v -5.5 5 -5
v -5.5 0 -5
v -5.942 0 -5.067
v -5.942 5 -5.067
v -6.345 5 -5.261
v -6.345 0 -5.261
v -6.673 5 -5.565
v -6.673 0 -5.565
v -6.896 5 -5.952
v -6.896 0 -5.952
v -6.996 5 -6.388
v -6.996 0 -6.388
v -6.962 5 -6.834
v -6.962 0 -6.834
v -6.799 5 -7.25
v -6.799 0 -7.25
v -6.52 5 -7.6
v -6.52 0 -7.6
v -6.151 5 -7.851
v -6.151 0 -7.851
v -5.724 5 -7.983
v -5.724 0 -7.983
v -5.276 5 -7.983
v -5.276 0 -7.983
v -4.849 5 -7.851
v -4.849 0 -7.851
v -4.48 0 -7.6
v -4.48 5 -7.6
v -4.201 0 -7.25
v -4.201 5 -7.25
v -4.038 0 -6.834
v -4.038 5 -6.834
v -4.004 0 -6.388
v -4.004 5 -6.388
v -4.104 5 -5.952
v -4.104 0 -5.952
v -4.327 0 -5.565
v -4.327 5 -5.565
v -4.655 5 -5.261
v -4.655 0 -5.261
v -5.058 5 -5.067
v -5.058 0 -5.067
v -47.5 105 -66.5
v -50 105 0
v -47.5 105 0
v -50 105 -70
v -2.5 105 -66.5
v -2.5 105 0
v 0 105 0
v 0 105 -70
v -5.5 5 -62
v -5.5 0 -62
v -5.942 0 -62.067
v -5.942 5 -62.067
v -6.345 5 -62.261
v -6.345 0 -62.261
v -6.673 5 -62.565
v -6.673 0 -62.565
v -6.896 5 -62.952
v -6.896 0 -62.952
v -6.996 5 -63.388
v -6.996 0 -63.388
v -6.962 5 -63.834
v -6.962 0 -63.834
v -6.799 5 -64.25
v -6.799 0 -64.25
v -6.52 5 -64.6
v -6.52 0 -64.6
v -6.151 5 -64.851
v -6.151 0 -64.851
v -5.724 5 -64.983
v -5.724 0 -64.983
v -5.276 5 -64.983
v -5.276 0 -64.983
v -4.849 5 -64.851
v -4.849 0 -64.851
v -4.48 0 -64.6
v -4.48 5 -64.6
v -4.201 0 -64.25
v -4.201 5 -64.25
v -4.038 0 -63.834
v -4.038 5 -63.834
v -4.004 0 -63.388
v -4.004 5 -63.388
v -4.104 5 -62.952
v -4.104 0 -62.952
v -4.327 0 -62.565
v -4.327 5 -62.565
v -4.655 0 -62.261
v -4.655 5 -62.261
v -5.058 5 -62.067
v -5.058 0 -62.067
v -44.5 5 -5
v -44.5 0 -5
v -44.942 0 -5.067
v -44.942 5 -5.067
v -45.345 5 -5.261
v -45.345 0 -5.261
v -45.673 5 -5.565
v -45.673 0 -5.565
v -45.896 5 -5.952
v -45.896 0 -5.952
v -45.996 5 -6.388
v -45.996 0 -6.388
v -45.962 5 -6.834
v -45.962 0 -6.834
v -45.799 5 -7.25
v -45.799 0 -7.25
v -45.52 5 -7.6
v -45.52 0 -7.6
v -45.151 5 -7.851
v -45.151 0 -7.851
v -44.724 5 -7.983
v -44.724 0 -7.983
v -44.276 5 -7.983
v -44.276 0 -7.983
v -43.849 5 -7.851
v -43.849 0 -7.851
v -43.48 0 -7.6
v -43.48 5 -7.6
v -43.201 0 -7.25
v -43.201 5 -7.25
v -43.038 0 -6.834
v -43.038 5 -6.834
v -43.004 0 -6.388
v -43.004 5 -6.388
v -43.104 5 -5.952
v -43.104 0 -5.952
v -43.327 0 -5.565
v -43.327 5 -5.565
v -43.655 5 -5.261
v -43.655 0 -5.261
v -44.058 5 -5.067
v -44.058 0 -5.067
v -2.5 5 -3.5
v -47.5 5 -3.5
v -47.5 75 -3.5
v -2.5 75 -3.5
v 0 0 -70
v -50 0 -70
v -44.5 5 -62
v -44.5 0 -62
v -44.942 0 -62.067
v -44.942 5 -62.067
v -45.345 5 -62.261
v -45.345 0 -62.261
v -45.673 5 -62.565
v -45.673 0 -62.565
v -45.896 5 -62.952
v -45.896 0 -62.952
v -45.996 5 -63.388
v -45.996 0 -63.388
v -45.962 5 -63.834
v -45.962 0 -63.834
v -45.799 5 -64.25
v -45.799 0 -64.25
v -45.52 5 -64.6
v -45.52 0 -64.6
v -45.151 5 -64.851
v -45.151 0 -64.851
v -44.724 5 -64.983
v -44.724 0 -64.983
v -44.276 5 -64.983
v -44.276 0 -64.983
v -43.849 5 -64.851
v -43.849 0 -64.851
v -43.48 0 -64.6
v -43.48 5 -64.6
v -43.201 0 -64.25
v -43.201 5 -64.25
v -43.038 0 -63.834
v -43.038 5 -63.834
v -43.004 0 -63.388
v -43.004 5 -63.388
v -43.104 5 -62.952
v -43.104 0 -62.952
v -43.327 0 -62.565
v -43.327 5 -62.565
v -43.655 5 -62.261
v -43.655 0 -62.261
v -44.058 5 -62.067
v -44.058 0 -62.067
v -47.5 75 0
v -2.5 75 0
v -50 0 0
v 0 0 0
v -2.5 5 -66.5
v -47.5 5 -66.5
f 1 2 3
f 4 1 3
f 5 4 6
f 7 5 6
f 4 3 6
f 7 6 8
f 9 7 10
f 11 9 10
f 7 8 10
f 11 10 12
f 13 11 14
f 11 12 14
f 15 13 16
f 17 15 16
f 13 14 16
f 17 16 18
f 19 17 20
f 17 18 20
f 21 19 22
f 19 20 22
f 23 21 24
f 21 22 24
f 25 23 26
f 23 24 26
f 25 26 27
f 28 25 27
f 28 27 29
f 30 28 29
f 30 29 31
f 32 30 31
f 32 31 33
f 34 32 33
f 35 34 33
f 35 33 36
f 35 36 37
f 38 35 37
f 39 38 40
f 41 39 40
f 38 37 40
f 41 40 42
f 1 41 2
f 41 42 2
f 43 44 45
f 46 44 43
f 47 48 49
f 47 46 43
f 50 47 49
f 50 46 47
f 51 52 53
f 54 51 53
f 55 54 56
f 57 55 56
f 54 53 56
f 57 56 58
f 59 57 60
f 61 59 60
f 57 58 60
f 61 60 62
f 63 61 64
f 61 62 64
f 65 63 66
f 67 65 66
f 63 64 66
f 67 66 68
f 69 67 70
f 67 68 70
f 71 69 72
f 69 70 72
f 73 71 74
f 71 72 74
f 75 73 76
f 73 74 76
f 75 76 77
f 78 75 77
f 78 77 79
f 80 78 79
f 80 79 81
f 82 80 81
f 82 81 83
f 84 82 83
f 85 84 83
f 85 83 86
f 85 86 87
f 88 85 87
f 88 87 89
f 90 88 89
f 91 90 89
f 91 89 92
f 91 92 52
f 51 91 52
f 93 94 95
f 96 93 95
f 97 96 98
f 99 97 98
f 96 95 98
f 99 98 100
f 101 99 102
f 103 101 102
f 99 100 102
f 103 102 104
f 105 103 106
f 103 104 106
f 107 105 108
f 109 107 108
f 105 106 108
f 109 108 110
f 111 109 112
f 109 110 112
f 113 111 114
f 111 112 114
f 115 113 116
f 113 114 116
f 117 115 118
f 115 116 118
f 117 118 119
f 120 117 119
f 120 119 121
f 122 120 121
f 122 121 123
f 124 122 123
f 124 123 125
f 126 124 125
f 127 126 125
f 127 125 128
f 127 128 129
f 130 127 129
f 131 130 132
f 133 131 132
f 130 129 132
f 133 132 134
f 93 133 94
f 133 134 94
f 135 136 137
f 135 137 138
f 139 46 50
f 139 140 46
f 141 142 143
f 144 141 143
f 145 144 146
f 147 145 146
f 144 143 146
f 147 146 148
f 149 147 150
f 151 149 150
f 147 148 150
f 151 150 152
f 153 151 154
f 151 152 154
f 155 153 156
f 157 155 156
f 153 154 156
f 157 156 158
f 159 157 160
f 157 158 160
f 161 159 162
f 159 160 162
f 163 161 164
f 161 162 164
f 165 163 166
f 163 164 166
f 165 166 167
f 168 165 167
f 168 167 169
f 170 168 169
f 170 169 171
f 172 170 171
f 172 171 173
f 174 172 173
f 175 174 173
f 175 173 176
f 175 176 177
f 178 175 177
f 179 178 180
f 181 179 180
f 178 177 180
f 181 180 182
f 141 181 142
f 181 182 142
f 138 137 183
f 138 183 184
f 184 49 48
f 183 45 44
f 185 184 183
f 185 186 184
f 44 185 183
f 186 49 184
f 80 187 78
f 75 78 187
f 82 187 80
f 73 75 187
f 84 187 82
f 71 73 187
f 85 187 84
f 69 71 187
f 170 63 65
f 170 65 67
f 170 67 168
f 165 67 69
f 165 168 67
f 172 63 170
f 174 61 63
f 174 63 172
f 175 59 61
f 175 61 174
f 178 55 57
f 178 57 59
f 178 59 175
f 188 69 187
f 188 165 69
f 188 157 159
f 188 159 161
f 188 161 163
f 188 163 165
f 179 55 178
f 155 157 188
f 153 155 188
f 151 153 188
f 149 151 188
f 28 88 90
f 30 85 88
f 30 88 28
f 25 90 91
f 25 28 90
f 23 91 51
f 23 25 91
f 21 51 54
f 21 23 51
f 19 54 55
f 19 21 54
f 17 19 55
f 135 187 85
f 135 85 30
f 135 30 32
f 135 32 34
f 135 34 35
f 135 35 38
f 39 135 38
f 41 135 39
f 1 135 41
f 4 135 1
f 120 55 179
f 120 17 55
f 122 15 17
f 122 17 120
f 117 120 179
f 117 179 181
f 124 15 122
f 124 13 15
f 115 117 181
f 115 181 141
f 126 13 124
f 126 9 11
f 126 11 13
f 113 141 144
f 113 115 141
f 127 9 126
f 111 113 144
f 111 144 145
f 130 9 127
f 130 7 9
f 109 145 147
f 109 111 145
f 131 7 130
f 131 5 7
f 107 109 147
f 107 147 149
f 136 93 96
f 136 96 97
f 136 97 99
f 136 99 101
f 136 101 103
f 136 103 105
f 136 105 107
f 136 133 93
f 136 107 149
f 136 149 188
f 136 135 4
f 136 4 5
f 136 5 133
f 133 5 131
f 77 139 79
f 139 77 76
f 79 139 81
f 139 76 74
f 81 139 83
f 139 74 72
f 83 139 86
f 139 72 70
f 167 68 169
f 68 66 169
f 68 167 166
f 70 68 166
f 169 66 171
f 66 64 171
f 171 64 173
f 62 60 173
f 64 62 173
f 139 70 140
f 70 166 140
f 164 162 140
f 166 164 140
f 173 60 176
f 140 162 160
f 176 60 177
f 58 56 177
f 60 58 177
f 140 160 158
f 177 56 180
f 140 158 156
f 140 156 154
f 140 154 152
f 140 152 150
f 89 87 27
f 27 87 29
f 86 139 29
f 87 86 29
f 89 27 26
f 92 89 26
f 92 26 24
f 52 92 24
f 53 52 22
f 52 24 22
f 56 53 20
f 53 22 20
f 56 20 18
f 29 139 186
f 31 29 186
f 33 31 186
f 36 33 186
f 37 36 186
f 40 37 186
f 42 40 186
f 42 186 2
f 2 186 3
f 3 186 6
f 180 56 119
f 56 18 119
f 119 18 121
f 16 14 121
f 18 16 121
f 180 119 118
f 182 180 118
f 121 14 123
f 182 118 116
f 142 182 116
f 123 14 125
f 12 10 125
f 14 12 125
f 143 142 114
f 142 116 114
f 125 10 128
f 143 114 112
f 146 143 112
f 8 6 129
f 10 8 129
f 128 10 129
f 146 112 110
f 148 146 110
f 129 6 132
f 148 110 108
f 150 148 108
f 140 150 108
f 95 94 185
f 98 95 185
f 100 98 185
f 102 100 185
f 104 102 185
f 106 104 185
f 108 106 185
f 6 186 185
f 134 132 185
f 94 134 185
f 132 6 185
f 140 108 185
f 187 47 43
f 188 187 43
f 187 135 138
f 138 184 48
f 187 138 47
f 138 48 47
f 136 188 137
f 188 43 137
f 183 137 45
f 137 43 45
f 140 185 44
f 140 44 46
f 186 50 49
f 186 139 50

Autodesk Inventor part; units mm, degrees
ref_plane "YZ Plane" through (0, 0, 0) normal (1, 0, 0) x (0, 1, 0)
ref_plane "XZ Plane" through (0, 0, 0) normal (0, 1, 0) x (-1, 0, 0)
ref_plane "XY Plane" through (0, 0, 0) normal (0, 0, 1) x (1, 0, 0)
sketch "Sketch1" plane through (0, 0, 0) normal (0, 1, 0) x (-1, 0, 0)
  line L0 (0, 0) -> (50, 0)
  line L1 (50, 0) -> (50, -70)
  line L2 (50, -70) -> (0, -70)
  line L3 (0, -70) -> (0, 0)
  dimension "d0" = 50
  dimension "d1" = 70
extrude "Extrusion1" add sketch "Sketch1" along normal blind 5
sketch "Sketch2" plane through (0, 5, 0) normal (0, 1, 0) x (1, 0, 0)
  line L0 (0, 0) -> (-50, 0)
  line L1 (-50, 70) -> (0, 70)
  line L2 (-2.5, 66.5) -> (-47.5, 66.5)
  line L3 (-47.5, 66.5) -> (-47.5, 3.5)
  line L4 (-47.5, 3.5) -> (-2.5, 3.5)
  line L5 (-2.5, 3.5) -> (-2.5, 66.5)
  line L6 (0, 0) -> (0, 70) projected
  line L7 (-50, 70) -> (-50, 0) projected
  line L8 (0, 70) -> (-50, 70) projected
  line L9 (-50, 0) -> (0, 0)
  line L10 (0, 0) -> (0, 70)
  line L11 (0, 70) -> (-50, 70)
  line L12 (-50, 70) -> (-50, 0)
  dimension "d22" = 63
  dimension "d24" = 45
  dimension "d25" = 2.5
  dimension "d27" = 3.5
  dimension "d28" = 50
extrude "Extrusion2" add sketch "Sketch2" along normal blind 100
sketch "Sketch3" plane through (0, 5, 0) normal (0, 1, 0) x (1, 0, 0)
  point P0 (0, 0)
sketch "Sketch5" plane through (0, 5, 0) normal (0, 1, 0) x (1, 0, 0)
  line L0 (-47.5, 3.5) -> (-47.5, 66.5) projected
  line L1 (-2.5, 3.5) -> (-47.5, 3.5) projected
  line L2 (-2.5, 66.5) -> (-2.5, 3.5) projected
  line L3 (-47.5, 66.5) -> (-2.5, 66.5) projected
  point P0 (0, 0)
  point P1 (-44.5, 6.5)
  point P2 (-44.5, 63.5)
  point P3 (-5.5, 63.5)
  point P4 (-5.5, 6.5)
  dimension "d36" = 3
  dimension "d37" = 3
  dimension "d38" = 3
  dimension "d39" = 3
  dimension "d40" = 3
  dimension "d41" = 3
  dimension "d42" = 3
  dimension "d43" = 3
hole "Hole2" at (-44.5, 5, -6.5) at (-5.5, 5, -6.5) at (-5.5, 5, -63.5) at (-44.5, 5, -63.5) direction (0, -1, 0) diameter 3 end through all
sketch "Sketch6" plane through (0, 105, 0) normal (0, 1, 0) x (1, 0, 0)
  line L0 (-50, 0) -> (0, 0) projected
  line L1 (-2.5, 3.5) -> (-47.5, 3.5)
  line L2 (-47.5, 3.5) -> (-47.5, 0)
  line L3 (-47.5, 0) -> (-2.5, 0)
  line L4 (-2.5, 0) -> (-2.5, 3.5)
  point P0 (-2.5, 0)
  dimension "d44" = 45
extrude "Extrusion3" cut sketch "Sketch6" against normal blind 30
properties part number "poerbankhållare_3DPrint"
